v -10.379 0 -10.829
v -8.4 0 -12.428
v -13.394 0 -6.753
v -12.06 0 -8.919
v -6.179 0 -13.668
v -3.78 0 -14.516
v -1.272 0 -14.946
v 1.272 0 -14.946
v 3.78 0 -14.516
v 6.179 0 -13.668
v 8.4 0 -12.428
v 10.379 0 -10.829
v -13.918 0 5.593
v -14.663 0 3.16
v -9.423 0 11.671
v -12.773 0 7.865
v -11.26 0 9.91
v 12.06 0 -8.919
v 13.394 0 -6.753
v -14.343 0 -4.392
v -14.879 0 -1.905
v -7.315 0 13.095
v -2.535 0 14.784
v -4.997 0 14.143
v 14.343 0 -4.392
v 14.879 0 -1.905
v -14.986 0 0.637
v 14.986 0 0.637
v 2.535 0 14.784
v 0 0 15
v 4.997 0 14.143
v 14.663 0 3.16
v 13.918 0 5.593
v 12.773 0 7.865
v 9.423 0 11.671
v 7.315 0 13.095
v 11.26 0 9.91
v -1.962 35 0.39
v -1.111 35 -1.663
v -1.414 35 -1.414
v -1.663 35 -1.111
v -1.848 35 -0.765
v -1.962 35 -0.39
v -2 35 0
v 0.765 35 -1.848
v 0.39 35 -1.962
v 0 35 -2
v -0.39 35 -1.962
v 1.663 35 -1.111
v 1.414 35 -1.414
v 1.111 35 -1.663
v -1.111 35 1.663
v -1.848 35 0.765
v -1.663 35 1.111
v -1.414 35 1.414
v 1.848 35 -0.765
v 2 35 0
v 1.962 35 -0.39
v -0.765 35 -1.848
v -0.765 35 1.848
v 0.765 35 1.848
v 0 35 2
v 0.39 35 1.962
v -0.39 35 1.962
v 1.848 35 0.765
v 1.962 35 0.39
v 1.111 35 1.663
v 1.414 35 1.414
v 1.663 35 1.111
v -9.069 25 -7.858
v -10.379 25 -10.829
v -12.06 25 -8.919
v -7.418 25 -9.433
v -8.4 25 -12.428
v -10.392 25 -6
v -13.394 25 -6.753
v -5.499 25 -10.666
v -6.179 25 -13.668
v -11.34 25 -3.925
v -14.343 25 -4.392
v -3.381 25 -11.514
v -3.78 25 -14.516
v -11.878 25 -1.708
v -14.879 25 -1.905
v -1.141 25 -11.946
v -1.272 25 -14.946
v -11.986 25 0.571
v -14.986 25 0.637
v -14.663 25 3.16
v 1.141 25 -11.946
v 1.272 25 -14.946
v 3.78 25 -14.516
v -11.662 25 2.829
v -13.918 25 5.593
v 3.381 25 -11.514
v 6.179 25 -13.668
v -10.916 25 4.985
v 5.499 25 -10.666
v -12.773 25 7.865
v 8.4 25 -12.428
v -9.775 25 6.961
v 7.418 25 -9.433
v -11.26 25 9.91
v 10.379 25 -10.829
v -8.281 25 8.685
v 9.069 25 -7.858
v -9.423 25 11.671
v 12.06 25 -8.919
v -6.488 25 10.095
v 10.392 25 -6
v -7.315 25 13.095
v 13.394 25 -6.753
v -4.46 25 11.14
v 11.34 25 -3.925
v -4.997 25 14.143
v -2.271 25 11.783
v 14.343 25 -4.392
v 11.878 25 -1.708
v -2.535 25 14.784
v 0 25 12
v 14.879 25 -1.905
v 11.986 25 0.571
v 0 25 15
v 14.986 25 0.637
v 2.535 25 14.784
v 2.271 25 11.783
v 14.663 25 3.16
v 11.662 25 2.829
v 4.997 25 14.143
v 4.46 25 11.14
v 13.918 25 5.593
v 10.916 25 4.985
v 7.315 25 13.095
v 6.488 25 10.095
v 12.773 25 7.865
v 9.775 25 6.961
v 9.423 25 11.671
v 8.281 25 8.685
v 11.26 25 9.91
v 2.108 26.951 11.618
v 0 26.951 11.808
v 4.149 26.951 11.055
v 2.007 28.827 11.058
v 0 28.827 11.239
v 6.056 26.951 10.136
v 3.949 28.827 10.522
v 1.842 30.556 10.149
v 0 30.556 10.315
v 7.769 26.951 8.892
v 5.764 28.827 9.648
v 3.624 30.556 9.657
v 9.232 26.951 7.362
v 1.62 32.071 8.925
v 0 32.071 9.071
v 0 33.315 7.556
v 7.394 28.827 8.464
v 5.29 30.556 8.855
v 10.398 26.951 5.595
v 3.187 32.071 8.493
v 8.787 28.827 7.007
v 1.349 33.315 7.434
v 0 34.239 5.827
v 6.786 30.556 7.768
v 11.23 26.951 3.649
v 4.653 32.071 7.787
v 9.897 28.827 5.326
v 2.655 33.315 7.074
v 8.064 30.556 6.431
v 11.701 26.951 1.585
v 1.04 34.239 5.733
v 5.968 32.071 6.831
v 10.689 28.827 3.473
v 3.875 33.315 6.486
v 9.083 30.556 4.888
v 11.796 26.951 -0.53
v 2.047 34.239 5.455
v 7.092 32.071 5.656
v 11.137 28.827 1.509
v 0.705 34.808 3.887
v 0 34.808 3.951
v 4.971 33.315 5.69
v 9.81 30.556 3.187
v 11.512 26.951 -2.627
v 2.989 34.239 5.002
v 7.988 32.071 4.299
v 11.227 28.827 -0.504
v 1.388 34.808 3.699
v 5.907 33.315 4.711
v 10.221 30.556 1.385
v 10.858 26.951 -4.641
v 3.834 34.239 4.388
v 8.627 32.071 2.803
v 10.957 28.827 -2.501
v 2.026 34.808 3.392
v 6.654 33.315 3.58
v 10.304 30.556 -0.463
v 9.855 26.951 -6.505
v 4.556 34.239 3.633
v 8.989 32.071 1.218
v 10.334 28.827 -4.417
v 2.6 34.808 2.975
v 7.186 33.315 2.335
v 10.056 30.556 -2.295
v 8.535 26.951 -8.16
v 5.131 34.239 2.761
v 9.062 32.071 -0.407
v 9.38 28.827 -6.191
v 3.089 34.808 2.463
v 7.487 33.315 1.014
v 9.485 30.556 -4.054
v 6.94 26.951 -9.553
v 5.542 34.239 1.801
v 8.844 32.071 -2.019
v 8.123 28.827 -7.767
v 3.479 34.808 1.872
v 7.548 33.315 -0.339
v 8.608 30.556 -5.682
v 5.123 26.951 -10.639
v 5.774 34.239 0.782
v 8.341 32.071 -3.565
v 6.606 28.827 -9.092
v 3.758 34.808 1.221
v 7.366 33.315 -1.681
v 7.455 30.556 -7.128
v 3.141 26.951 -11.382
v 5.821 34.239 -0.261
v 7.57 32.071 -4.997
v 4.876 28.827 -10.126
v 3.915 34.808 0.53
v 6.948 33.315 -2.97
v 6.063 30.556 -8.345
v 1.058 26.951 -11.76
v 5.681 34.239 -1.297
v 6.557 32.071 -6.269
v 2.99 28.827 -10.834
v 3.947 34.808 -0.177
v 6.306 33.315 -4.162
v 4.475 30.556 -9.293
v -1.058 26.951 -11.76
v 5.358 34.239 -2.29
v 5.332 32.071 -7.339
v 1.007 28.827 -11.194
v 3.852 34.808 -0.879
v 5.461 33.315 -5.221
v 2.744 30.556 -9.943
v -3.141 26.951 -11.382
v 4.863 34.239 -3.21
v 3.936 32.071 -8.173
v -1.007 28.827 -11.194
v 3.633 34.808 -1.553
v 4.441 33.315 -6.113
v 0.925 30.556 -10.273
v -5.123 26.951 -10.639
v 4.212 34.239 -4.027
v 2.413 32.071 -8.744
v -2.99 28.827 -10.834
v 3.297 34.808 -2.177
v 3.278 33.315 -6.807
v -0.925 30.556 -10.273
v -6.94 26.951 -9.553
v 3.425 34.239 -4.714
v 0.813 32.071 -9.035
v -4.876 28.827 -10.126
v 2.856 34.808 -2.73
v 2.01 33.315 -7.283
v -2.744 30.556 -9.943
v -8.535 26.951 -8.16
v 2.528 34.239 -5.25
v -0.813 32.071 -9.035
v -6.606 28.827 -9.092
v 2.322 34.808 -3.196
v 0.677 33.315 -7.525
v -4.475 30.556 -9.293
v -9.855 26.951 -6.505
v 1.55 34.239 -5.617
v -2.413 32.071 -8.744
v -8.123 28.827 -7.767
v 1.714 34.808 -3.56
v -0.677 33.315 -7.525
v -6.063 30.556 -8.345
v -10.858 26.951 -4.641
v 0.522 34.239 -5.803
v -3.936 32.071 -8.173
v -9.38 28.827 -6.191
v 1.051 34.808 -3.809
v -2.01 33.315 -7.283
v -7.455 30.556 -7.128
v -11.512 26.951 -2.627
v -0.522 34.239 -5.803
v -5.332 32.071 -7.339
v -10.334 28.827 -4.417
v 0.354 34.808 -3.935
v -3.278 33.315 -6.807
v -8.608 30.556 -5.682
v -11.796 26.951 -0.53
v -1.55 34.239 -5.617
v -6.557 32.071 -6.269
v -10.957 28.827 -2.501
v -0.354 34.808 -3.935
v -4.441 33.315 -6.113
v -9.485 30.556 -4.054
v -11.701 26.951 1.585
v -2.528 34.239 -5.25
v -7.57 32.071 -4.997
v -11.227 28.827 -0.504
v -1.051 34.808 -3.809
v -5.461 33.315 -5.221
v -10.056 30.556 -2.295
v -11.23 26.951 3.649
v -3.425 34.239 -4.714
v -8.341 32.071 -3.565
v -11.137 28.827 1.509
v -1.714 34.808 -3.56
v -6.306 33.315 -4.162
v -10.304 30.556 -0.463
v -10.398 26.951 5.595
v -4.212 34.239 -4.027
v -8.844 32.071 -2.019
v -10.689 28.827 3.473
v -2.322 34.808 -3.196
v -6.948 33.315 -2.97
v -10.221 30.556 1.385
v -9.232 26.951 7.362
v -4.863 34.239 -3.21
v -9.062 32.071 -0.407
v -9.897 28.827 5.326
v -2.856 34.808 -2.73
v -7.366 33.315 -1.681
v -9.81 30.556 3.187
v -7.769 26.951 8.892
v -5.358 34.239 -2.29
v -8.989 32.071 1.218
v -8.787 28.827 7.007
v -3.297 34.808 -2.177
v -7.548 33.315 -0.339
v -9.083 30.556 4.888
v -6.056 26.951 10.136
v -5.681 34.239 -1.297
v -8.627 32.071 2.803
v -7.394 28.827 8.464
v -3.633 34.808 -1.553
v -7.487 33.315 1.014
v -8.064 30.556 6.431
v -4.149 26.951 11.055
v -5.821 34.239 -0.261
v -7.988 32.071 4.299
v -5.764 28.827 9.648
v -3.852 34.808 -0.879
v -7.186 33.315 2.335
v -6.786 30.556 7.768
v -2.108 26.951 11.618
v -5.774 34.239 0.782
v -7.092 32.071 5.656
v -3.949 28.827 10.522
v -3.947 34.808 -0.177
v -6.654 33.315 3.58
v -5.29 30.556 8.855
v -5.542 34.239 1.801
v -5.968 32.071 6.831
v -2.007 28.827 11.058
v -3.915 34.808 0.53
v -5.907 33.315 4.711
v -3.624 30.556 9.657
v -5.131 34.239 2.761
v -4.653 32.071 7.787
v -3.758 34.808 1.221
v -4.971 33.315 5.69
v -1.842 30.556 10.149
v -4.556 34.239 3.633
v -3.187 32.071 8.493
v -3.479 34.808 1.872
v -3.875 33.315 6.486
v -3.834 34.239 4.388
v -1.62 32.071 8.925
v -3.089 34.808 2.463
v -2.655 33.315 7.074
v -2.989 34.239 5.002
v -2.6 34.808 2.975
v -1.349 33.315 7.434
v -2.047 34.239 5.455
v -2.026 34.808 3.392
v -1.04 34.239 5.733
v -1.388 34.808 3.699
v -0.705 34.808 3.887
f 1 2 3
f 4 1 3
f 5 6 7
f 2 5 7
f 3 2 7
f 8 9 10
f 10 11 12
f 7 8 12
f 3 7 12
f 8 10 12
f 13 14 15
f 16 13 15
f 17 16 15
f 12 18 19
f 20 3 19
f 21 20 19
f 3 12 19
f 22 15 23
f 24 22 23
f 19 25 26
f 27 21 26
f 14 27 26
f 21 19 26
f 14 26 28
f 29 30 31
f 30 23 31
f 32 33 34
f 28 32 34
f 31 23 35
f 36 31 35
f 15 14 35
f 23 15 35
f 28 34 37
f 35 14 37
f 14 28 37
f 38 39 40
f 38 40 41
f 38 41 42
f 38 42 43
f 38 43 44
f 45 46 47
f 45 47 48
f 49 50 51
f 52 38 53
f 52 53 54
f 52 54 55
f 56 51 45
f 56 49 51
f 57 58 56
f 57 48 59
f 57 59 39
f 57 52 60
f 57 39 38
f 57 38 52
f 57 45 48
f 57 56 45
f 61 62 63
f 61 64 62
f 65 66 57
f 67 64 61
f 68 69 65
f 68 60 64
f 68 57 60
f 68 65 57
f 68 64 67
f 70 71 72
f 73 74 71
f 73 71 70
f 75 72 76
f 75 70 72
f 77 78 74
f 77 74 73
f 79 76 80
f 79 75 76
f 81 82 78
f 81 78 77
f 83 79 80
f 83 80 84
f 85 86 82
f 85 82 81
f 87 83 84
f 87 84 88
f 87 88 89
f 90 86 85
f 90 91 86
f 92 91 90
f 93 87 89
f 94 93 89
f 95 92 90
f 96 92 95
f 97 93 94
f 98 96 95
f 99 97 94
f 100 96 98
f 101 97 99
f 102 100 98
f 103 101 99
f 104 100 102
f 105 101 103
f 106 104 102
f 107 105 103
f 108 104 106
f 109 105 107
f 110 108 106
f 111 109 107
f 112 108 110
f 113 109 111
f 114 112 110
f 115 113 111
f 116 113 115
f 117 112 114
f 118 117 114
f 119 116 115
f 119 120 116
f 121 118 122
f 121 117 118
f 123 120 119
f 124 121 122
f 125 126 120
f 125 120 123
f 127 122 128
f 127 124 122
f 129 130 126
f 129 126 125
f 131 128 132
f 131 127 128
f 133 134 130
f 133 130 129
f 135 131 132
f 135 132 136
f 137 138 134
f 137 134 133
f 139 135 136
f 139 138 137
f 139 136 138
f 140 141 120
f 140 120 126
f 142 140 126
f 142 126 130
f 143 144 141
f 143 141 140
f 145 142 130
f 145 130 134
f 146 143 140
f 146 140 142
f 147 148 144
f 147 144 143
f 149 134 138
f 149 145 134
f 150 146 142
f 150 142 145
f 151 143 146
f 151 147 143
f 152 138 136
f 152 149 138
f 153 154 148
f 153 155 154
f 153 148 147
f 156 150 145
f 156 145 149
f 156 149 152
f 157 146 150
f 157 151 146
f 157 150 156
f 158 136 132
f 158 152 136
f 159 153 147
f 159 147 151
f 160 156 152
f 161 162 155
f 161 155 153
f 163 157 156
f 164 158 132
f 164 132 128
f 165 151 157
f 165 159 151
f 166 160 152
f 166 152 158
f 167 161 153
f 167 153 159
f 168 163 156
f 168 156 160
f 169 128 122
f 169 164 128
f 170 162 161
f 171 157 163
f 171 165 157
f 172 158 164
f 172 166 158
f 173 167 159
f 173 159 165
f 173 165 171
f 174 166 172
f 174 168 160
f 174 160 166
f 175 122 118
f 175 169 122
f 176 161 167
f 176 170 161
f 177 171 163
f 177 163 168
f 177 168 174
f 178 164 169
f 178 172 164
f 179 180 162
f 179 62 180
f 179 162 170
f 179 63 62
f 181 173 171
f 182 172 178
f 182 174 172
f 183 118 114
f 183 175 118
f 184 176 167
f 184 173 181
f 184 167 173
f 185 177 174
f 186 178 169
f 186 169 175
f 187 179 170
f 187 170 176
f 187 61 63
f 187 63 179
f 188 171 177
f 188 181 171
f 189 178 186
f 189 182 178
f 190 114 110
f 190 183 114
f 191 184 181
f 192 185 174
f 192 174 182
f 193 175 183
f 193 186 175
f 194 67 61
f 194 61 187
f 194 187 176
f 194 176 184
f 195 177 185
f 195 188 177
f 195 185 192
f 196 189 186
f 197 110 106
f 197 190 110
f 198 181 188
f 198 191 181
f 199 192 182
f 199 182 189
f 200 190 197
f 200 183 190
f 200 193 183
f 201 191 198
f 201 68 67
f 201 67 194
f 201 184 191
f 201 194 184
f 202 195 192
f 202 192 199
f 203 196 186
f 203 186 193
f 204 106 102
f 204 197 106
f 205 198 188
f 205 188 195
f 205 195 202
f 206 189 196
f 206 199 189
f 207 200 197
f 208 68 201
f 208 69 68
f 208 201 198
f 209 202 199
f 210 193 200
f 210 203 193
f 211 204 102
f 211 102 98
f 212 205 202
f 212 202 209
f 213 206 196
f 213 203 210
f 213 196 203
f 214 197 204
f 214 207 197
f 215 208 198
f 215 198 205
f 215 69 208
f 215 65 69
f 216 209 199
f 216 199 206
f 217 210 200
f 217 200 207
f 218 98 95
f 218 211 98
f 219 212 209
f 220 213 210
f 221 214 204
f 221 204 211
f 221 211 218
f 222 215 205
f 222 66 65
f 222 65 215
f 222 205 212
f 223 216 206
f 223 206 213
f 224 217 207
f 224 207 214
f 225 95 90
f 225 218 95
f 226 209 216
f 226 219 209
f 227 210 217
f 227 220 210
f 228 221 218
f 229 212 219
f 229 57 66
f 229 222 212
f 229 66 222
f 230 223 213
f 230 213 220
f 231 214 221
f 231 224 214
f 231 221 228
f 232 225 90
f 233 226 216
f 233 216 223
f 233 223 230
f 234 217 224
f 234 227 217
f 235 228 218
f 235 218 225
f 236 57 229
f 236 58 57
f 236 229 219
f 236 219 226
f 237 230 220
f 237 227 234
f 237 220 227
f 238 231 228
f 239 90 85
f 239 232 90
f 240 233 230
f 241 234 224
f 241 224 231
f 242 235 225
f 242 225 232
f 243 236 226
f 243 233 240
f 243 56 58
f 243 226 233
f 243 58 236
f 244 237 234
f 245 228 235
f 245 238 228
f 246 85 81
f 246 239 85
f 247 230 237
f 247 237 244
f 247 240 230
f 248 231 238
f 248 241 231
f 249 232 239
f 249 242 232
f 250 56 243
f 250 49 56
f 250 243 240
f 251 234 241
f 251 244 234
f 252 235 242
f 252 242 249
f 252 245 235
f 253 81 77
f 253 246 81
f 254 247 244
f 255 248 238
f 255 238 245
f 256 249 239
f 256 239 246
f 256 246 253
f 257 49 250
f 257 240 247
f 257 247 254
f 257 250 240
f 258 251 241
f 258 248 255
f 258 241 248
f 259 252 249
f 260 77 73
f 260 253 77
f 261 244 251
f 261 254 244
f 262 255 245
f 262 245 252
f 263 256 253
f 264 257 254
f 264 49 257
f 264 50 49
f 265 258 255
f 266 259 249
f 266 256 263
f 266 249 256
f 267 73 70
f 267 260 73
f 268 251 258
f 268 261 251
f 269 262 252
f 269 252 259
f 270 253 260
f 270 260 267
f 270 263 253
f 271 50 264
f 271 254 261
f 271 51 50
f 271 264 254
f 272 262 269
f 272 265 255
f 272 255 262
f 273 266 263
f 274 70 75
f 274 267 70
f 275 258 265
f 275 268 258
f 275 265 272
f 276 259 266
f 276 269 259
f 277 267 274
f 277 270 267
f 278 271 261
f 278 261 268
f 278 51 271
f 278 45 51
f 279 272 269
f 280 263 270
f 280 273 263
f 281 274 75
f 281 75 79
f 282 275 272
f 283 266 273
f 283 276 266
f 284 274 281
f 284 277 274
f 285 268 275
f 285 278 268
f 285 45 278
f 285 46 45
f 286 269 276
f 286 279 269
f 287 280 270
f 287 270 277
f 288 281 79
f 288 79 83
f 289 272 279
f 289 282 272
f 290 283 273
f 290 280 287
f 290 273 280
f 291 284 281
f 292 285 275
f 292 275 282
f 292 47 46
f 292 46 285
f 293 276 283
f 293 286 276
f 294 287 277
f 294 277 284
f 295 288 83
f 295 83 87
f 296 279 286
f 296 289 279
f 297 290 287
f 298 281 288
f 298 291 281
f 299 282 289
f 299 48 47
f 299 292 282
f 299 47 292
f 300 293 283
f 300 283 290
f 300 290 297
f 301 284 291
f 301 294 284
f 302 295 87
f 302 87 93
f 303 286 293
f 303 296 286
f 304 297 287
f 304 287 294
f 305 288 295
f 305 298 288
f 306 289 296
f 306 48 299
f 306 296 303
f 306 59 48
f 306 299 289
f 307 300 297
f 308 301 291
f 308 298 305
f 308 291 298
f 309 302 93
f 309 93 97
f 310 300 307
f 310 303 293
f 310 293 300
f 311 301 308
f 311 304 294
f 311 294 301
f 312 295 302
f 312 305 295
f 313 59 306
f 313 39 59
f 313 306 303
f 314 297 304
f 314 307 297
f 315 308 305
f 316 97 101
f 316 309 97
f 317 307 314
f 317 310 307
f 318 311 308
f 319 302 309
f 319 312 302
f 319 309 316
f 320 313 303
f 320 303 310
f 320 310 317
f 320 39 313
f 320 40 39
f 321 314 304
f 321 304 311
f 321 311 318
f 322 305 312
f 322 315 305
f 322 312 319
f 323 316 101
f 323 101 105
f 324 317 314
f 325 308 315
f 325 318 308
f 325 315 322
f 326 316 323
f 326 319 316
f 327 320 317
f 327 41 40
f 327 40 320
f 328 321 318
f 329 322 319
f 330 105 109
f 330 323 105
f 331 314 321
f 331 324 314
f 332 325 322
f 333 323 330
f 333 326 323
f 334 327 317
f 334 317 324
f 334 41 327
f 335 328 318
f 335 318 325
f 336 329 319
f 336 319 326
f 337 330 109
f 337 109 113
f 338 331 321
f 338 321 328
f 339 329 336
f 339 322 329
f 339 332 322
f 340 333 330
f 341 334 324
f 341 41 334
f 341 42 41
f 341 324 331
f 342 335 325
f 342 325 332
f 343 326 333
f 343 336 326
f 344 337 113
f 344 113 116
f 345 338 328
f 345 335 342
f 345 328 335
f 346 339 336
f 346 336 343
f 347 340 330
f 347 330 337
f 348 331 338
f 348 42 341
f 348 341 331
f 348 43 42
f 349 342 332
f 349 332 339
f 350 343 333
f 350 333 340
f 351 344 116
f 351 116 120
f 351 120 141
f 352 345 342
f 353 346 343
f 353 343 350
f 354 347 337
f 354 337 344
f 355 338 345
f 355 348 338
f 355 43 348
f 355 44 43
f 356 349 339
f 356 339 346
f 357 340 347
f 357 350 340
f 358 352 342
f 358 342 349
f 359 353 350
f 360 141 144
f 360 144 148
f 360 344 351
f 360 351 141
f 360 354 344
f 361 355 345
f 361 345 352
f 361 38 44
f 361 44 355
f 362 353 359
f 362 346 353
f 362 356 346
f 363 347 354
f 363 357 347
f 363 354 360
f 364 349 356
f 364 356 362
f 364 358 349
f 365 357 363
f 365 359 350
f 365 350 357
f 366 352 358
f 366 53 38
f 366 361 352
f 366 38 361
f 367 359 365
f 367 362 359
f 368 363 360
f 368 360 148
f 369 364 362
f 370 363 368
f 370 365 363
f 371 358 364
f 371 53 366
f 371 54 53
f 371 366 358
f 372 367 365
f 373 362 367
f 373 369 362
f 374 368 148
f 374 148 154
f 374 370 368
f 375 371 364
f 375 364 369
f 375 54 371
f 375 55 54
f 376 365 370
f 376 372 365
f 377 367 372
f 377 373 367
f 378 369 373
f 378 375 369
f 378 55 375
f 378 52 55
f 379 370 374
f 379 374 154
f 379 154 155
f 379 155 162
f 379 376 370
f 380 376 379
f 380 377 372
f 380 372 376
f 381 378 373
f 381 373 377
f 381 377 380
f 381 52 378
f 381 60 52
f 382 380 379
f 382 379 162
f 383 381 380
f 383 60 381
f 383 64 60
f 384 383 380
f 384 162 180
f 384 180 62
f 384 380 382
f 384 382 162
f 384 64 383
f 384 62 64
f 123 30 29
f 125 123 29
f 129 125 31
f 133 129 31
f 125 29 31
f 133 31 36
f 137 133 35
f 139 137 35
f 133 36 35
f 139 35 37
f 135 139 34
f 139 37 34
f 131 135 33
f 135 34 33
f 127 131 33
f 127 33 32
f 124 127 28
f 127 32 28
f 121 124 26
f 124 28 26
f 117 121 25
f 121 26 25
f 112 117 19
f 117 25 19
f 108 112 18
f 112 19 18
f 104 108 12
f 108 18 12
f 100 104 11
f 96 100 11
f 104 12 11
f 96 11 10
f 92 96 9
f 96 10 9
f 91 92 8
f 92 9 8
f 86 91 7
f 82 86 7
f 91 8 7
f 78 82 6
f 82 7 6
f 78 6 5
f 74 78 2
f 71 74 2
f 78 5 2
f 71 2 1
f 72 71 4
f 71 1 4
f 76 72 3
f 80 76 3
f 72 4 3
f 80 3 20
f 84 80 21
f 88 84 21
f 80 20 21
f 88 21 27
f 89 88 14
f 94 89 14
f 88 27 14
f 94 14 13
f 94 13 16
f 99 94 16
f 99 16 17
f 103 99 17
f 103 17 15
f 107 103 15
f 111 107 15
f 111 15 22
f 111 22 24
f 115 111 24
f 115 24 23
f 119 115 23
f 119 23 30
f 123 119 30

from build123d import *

# Parameters (mm, degrees)
SKETCH1_R           = 15
BOSS_EXTRUDE1_DEPTH = 25
SKETCH2_R           = 12
CUT_EXTRUDE1_DEPTH  = 10
BOSS_EXTRUDE2_START = 20
SKETCH3_R           = 12
BOSS_EXTRUDE2_DEPTH = 20
FILLET1_R           = 10


with BuildPart() as part:
    # Sketch1 → Boss-Extrude1 (new body)
    with BuildSketch(Plane(origin=(0, 0, 0), x_dir=(1, 0, 0), z_dir=(0, 1, 0))):
        with Locations(Location((0, 0, 0), (0, 0, 270))):
            Circle(SKETCH1_R)
    extrude(amount=BOSS_EXTRUDE1_DEPTH)

    # Sketch2 → Cut-Extrude1 (cut)
    with BuildSketch(Plane(origin=(0, 25, 0), x_dir=(1, 0, 0), z_dir=(0, 1, 0))):
        with Locations(Location((0, 0, 0), (0, 0, 270))):
            Circle(SKETCH2_R)
    extrude(amount=-CUT_EXTRUDE1_DEPTH, mode=Mode.SUBTRACT)

    # Sketch3 → Boss-Extrude2 (add)
    with BuildSketch(Plane(origin=(0, 15, 0), x_dir=(1, 0, 0), z_dir=(0, 1, 0)).offset(BOSS_EXTRUDE2_START)):
        with Locations(Location((0, 0, 0), (0, 0, 270))):
            Circle(SKETCH3_R)
    extrude(amount=-BOSS_EXTRUDE2_DEPTH)

    # Fillet1
    fillet1_edges = [part.edges().sort_by_distance(p)[0] for p in [
        (0, 35, -12),
    ]]
    fillet(fillet1_edges, radius=FILLET1_R - 0.0001)  # a hair under: the kernel refuses the full size


solid = part.part
